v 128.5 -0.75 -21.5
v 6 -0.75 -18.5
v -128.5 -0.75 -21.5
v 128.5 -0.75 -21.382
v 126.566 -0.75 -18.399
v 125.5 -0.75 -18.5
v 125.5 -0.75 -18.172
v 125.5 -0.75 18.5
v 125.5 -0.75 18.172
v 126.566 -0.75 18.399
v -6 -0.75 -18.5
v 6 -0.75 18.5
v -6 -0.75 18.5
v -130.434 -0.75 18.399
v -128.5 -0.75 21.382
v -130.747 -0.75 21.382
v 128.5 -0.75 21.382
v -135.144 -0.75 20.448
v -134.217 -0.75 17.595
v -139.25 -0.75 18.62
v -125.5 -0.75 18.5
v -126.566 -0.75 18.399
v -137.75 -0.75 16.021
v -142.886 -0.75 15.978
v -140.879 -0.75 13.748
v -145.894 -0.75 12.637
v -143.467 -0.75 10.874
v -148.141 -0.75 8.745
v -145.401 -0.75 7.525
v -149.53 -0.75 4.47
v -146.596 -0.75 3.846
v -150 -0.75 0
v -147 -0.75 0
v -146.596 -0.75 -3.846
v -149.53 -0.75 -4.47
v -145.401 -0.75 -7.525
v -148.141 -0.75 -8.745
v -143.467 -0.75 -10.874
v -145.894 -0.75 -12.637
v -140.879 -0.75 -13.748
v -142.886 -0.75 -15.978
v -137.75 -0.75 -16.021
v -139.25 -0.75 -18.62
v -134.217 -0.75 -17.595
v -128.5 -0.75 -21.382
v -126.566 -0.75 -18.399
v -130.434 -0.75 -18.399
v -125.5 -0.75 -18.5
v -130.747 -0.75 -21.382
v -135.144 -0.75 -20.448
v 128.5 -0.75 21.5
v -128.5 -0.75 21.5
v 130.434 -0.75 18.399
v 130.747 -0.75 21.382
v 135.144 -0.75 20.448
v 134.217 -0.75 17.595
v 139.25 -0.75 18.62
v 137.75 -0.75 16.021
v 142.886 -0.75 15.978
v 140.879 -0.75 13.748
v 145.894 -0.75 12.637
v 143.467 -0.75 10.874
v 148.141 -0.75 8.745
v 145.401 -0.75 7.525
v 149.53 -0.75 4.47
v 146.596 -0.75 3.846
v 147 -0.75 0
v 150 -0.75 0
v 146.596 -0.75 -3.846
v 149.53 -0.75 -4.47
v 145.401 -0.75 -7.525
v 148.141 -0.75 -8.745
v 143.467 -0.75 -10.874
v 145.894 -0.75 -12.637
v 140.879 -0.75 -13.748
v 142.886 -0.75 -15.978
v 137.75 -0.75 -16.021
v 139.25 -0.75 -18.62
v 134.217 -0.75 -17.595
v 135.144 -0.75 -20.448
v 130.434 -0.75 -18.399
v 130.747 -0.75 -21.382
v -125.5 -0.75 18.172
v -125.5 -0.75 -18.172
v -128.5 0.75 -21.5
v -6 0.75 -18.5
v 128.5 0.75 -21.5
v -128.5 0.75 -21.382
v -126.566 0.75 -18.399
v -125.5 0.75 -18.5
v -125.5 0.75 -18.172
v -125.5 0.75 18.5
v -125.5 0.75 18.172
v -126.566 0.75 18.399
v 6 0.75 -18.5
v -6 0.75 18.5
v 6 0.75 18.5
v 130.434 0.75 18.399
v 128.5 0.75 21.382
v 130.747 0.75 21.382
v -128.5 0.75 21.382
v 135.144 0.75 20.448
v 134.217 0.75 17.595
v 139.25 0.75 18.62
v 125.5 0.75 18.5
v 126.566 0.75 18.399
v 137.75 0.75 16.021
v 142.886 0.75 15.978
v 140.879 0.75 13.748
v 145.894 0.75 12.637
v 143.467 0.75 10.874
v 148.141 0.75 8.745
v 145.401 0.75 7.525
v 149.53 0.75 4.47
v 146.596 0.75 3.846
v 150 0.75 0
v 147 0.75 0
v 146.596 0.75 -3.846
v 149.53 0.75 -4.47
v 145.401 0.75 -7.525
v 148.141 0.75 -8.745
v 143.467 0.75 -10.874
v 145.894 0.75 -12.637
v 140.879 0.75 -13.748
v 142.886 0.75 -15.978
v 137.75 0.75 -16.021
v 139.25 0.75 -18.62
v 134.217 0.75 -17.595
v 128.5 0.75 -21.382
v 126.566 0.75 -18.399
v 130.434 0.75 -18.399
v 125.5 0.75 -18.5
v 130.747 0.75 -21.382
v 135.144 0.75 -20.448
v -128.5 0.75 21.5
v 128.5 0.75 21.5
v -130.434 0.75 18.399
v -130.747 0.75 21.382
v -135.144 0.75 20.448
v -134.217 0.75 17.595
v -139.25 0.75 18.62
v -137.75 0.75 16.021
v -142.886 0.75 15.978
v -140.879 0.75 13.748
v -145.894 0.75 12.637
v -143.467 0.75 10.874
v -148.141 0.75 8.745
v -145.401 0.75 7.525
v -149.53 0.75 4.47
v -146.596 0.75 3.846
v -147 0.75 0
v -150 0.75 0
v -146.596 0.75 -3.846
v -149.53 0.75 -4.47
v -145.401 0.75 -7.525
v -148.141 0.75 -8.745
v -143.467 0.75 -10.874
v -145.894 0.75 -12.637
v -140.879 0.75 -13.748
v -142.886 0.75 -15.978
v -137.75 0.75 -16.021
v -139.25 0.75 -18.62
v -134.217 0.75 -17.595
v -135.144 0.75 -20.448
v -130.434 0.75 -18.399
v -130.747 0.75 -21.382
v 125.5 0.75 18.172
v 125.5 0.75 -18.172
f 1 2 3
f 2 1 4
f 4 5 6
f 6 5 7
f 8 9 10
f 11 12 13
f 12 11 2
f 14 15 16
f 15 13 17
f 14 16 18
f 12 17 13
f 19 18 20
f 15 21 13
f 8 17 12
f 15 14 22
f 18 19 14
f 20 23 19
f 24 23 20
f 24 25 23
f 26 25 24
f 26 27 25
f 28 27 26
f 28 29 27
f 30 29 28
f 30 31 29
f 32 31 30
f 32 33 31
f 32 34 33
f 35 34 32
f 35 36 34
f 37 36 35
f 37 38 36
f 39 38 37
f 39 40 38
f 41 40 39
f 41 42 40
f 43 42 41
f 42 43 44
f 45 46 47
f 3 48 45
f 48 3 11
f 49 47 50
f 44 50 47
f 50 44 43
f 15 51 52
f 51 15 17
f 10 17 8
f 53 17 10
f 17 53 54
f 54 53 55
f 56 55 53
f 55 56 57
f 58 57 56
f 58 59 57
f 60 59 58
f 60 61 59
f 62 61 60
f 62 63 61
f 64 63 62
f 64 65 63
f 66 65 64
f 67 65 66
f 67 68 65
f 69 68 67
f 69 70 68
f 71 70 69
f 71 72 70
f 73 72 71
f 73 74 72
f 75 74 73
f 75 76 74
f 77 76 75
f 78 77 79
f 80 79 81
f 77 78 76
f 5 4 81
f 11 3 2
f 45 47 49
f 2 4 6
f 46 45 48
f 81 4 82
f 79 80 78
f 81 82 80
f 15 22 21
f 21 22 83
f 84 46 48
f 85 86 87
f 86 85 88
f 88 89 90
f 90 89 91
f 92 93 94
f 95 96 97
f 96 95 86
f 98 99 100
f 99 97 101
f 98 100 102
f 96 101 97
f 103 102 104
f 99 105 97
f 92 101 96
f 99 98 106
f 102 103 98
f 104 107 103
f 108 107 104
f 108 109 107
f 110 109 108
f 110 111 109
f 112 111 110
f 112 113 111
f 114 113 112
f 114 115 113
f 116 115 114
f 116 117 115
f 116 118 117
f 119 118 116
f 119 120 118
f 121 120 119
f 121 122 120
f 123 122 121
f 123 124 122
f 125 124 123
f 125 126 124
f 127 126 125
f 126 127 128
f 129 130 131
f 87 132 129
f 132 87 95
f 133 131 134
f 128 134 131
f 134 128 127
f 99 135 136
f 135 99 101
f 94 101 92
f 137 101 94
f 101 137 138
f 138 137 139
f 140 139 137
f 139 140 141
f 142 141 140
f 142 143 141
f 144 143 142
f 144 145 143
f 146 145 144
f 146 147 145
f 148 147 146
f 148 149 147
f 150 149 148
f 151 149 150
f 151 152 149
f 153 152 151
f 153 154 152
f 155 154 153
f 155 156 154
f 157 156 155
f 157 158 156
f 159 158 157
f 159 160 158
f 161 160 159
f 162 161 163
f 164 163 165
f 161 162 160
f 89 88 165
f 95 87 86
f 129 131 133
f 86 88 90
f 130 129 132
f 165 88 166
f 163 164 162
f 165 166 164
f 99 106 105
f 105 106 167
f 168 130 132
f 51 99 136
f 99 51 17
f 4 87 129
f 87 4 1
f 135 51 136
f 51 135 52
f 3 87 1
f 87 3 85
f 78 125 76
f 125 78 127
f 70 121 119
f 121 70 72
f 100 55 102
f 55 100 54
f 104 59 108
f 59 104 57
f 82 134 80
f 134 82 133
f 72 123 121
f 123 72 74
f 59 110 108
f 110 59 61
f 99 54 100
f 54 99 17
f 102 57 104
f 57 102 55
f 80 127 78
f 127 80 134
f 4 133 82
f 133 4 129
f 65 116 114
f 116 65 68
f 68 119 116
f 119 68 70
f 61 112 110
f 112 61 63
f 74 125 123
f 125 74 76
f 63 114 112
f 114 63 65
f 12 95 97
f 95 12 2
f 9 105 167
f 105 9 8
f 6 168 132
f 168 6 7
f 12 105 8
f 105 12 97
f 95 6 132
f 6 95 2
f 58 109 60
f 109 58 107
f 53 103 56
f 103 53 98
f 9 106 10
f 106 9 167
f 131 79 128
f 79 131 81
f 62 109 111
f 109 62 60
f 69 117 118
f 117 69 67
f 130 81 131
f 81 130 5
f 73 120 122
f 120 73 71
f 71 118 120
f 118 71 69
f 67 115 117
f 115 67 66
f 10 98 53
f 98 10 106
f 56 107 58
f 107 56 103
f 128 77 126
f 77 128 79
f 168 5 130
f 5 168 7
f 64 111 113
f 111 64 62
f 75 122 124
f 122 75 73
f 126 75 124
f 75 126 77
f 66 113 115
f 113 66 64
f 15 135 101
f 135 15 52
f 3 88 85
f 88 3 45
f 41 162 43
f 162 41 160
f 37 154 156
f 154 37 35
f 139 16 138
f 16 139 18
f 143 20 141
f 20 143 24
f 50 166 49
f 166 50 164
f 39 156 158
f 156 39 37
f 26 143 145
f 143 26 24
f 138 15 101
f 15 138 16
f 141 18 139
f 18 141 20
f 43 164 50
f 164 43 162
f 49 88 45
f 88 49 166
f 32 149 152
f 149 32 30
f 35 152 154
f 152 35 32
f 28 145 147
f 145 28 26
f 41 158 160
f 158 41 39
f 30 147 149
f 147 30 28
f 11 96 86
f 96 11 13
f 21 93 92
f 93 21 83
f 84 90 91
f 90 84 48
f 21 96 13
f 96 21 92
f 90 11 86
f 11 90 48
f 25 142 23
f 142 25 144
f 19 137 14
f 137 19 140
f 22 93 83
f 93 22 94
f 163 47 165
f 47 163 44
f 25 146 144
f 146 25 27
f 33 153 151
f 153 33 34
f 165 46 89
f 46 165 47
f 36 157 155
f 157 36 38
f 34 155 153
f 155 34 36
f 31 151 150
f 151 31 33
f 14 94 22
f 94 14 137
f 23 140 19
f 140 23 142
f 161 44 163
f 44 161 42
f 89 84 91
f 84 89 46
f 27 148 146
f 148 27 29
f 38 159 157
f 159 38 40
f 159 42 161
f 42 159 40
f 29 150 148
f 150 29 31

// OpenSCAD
module HighGoal(rot,mir) {
    rotate(a=rot) {
        mirror(v=mir) {
            rotate(a=[90,0,0]) {
                translate([-125.5,-21.5,-0.75]) {
                    difference() {
                        union() {
                            cube([125.5,43,1.5]);
                            translate([0,21.5,0]) {
                                cylinder(h=1.5, r=21.5);
                            }
                        }
                        union() {
                            translate([3,3,0]) {
                                cube([119.5,37,1.5]);
                            }
                            translate([0,21.5,0]) {
                                cylinder(h=1.5, r=18.5);
                            }
                        }
                    }
                }
            }
        }
    }
}
module DualHighGoal() {
    translate([-6,-0.75,-21.5]) {
        cube([12,1.5,43]);
    }
    translate([3,0,0]) {
        HighGoal();
    }
    translate([-3,0,0]) {
        HighGoal(0,[0,1,0]);
    }
}

DualHighGoal();
